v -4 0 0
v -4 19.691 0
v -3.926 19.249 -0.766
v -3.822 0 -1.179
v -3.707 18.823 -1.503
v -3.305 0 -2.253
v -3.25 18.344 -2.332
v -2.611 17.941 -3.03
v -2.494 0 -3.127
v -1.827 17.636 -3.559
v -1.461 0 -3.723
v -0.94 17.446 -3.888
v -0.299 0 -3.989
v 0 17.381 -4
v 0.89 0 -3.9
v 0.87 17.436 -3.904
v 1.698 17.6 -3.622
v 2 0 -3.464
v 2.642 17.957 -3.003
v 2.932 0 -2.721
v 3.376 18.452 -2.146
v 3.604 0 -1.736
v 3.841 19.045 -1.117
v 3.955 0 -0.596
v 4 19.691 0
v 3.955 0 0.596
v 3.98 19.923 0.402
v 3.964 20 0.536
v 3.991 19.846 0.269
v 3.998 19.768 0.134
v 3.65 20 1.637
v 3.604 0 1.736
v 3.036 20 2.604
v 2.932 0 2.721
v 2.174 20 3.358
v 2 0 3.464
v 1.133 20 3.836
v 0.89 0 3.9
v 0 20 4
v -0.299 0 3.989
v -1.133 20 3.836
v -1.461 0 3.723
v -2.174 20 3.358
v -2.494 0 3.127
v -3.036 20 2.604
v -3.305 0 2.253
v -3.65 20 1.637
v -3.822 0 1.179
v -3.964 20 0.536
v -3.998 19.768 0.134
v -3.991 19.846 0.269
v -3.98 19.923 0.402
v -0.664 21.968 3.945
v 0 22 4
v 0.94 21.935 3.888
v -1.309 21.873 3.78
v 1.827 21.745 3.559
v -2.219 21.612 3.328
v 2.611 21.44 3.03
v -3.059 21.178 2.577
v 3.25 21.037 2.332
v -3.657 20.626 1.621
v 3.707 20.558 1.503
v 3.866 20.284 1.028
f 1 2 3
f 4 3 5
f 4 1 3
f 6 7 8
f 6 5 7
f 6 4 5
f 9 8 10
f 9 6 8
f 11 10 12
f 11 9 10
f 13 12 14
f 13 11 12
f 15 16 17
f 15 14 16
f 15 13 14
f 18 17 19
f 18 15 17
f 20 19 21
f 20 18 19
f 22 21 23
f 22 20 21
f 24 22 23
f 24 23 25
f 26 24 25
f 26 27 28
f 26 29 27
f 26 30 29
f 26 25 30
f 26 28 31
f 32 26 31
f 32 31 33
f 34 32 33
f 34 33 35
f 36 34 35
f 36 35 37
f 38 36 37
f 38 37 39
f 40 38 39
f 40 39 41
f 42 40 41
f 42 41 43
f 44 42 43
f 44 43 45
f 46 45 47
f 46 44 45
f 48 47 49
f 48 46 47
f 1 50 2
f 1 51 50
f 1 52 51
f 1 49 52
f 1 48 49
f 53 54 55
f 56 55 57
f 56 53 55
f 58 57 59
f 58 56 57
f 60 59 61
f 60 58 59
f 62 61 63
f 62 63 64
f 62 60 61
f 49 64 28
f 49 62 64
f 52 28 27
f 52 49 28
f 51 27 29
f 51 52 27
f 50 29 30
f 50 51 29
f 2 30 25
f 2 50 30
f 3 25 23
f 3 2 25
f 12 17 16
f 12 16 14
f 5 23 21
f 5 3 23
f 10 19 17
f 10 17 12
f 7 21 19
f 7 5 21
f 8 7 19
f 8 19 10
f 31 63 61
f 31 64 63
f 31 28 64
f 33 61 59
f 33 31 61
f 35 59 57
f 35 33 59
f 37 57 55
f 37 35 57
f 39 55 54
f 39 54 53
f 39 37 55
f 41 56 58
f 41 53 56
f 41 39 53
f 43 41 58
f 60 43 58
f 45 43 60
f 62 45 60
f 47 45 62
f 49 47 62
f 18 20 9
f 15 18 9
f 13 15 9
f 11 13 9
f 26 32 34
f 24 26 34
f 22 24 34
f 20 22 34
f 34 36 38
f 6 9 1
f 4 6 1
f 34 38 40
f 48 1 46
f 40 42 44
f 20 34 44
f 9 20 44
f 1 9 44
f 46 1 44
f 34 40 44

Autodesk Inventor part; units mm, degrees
ref_plane "YZ Plane" through (0, 0, 0) normal (1, 0, 0) x (0, 1, 0)
ref_plane "XZ Plane" through (0, 0, 0) normal (0, 1, 0) x (-1, 0, 0)
sketch "Sketch1" plane through (0, 0, 0) normal (0, 1, 0) x (-1, 0, 0)
  circle A0 centre (0, 0) radius 4
  dimension "d0" = 8
extrude "Extrusion1" add sketch "Sketch1" along normal blind 20
sketch "Sketch2" plane through (0, 20, 0) normal (0, 1, 0) x (1, 0, 0)
  circle A0 centre (0, 0) radius 4
  dimension "d3" = 8
extrude "Extrusion2" add sketch "Sketch2" along normal blind 2
sketch "Sketch3" plane through (0, 0, 0) normal (1, 0, 0) x (0, 1, 0)
  line L0 (22, -4) -> (22, 4) projected
  line L1 (22, 4) -> (17.3812, -4)
  line L2 (0, -4) -> (22, -4) projected
  line L3 (22, 4) -> (31.2376, 4) construction
  line L4 (17.3812, -4) -> (22, -4)
  line L5 (22, 4) -> (22, -4)
  point P0 (0, 0)
  dimension "d6" = 120
extrude "Extrusion3" cut sketch "Sketch3" along normal through all both and the other way through all
sketch "Sketch4" plane through (0, 0, 0) normal (1, 0, 0) x (0, 1, 0)
  point P0 (0, 0)
ref_plane "Work Plane2" through (0, 19.6906, 0) normal (0, 0.5, 0.866) x (-1, 0, 0)
ref_plane "Work Plane1" through (0, 19.6906, 0) normal (0, 0.866, 0.5) x (1, 0, 0)
properties part number "Camera encasing" material "Rubber"
